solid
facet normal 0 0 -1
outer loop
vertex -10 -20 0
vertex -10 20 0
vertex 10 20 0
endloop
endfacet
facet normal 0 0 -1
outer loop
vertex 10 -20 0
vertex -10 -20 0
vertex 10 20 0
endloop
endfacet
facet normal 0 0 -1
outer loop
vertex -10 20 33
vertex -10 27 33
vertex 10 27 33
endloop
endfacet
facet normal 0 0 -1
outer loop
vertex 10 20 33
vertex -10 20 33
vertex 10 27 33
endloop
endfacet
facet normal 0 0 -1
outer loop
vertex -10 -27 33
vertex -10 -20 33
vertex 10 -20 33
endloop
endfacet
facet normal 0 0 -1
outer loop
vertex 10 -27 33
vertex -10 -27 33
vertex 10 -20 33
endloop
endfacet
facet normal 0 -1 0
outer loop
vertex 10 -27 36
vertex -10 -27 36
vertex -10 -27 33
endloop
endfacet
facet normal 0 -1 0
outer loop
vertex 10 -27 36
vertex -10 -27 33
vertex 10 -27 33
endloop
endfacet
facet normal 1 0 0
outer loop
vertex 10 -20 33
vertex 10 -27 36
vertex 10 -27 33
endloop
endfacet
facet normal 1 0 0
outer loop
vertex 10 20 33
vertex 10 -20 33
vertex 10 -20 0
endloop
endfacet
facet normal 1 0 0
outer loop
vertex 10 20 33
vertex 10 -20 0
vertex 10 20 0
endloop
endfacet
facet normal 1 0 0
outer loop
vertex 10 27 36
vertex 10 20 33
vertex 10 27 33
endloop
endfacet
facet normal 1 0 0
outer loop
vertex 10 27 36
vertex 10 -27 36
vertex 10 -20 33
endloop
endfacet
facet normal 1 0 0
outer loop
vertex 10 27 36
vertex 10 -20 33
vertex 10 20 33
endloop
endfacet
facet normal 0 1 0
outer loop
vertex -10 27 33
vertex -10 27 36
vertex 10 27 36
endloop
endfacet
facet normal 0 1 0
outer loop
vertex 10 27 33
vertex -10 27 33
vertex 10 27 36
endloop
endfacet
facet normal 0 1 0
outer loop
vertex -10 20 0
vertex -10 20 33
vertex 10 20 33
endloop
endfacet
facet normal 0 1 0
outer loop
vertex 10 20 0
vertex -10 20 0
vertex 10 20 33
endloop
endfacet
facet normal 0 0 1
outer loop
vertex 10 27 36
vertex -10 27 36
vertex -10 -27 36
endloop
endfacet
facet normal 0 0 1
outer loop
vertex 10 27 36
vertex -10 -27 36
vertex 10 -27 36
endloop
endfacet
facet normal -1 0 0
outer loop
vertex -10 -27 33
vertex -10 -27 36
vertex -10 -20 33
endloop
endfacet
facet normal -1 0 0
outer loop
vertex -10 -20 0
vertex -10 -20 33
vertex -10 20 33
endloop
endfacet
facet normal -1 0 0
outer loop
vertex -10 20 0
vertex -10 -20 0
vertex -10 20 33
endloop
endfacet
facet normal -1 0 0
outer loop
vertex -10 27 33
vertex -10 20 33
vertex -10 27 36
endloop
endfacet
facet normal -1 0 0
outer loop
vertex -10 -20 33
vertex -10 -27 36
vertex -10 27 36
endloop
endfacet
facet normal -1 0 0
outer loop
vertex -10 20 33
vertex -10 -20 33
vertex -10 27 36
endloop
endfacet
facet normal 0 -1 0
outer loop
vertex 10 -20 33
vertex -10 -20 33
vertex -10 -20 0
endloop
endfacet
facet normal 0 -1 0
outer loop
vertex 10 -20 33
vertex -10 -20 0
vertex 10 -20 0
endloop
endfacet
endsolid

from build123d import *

# Parameters (mm, degrees)
SKETCH1_W           = 20
SKETCH1_H           = 40
BOSS_EXTRUDE1_DEPTH = 36
SKETCH2_W           = 20
SKETCH2_H           = 7
BOSS_EXTRUDE5_DEPTH = 3


with BuildPart() as part:
    # Sketch1 → Boss-Extrude1 (new body)
    with BuildSketch(Plane.XY):
        Rectangle(SKETCH1_W, SKETCH1_H)
    extrude(amount=BOSS_EXTRUDE1_DEPTH)

    # Sketch2 → Boss-Extrude5 (add)
    with BuildSketch(Plane.XY.offset(36)):
        with Locations((0, 23.5)):
            Rectangle(SKETCH2_W, SKETCH2_H)
        with Locations((0, -23.5)):
            Rectangle(SKETCH2_W, SKETCH2_H)
    extrude(amount=-BOSS_EXTRUDE5_DEPTH)


solid = part.part
